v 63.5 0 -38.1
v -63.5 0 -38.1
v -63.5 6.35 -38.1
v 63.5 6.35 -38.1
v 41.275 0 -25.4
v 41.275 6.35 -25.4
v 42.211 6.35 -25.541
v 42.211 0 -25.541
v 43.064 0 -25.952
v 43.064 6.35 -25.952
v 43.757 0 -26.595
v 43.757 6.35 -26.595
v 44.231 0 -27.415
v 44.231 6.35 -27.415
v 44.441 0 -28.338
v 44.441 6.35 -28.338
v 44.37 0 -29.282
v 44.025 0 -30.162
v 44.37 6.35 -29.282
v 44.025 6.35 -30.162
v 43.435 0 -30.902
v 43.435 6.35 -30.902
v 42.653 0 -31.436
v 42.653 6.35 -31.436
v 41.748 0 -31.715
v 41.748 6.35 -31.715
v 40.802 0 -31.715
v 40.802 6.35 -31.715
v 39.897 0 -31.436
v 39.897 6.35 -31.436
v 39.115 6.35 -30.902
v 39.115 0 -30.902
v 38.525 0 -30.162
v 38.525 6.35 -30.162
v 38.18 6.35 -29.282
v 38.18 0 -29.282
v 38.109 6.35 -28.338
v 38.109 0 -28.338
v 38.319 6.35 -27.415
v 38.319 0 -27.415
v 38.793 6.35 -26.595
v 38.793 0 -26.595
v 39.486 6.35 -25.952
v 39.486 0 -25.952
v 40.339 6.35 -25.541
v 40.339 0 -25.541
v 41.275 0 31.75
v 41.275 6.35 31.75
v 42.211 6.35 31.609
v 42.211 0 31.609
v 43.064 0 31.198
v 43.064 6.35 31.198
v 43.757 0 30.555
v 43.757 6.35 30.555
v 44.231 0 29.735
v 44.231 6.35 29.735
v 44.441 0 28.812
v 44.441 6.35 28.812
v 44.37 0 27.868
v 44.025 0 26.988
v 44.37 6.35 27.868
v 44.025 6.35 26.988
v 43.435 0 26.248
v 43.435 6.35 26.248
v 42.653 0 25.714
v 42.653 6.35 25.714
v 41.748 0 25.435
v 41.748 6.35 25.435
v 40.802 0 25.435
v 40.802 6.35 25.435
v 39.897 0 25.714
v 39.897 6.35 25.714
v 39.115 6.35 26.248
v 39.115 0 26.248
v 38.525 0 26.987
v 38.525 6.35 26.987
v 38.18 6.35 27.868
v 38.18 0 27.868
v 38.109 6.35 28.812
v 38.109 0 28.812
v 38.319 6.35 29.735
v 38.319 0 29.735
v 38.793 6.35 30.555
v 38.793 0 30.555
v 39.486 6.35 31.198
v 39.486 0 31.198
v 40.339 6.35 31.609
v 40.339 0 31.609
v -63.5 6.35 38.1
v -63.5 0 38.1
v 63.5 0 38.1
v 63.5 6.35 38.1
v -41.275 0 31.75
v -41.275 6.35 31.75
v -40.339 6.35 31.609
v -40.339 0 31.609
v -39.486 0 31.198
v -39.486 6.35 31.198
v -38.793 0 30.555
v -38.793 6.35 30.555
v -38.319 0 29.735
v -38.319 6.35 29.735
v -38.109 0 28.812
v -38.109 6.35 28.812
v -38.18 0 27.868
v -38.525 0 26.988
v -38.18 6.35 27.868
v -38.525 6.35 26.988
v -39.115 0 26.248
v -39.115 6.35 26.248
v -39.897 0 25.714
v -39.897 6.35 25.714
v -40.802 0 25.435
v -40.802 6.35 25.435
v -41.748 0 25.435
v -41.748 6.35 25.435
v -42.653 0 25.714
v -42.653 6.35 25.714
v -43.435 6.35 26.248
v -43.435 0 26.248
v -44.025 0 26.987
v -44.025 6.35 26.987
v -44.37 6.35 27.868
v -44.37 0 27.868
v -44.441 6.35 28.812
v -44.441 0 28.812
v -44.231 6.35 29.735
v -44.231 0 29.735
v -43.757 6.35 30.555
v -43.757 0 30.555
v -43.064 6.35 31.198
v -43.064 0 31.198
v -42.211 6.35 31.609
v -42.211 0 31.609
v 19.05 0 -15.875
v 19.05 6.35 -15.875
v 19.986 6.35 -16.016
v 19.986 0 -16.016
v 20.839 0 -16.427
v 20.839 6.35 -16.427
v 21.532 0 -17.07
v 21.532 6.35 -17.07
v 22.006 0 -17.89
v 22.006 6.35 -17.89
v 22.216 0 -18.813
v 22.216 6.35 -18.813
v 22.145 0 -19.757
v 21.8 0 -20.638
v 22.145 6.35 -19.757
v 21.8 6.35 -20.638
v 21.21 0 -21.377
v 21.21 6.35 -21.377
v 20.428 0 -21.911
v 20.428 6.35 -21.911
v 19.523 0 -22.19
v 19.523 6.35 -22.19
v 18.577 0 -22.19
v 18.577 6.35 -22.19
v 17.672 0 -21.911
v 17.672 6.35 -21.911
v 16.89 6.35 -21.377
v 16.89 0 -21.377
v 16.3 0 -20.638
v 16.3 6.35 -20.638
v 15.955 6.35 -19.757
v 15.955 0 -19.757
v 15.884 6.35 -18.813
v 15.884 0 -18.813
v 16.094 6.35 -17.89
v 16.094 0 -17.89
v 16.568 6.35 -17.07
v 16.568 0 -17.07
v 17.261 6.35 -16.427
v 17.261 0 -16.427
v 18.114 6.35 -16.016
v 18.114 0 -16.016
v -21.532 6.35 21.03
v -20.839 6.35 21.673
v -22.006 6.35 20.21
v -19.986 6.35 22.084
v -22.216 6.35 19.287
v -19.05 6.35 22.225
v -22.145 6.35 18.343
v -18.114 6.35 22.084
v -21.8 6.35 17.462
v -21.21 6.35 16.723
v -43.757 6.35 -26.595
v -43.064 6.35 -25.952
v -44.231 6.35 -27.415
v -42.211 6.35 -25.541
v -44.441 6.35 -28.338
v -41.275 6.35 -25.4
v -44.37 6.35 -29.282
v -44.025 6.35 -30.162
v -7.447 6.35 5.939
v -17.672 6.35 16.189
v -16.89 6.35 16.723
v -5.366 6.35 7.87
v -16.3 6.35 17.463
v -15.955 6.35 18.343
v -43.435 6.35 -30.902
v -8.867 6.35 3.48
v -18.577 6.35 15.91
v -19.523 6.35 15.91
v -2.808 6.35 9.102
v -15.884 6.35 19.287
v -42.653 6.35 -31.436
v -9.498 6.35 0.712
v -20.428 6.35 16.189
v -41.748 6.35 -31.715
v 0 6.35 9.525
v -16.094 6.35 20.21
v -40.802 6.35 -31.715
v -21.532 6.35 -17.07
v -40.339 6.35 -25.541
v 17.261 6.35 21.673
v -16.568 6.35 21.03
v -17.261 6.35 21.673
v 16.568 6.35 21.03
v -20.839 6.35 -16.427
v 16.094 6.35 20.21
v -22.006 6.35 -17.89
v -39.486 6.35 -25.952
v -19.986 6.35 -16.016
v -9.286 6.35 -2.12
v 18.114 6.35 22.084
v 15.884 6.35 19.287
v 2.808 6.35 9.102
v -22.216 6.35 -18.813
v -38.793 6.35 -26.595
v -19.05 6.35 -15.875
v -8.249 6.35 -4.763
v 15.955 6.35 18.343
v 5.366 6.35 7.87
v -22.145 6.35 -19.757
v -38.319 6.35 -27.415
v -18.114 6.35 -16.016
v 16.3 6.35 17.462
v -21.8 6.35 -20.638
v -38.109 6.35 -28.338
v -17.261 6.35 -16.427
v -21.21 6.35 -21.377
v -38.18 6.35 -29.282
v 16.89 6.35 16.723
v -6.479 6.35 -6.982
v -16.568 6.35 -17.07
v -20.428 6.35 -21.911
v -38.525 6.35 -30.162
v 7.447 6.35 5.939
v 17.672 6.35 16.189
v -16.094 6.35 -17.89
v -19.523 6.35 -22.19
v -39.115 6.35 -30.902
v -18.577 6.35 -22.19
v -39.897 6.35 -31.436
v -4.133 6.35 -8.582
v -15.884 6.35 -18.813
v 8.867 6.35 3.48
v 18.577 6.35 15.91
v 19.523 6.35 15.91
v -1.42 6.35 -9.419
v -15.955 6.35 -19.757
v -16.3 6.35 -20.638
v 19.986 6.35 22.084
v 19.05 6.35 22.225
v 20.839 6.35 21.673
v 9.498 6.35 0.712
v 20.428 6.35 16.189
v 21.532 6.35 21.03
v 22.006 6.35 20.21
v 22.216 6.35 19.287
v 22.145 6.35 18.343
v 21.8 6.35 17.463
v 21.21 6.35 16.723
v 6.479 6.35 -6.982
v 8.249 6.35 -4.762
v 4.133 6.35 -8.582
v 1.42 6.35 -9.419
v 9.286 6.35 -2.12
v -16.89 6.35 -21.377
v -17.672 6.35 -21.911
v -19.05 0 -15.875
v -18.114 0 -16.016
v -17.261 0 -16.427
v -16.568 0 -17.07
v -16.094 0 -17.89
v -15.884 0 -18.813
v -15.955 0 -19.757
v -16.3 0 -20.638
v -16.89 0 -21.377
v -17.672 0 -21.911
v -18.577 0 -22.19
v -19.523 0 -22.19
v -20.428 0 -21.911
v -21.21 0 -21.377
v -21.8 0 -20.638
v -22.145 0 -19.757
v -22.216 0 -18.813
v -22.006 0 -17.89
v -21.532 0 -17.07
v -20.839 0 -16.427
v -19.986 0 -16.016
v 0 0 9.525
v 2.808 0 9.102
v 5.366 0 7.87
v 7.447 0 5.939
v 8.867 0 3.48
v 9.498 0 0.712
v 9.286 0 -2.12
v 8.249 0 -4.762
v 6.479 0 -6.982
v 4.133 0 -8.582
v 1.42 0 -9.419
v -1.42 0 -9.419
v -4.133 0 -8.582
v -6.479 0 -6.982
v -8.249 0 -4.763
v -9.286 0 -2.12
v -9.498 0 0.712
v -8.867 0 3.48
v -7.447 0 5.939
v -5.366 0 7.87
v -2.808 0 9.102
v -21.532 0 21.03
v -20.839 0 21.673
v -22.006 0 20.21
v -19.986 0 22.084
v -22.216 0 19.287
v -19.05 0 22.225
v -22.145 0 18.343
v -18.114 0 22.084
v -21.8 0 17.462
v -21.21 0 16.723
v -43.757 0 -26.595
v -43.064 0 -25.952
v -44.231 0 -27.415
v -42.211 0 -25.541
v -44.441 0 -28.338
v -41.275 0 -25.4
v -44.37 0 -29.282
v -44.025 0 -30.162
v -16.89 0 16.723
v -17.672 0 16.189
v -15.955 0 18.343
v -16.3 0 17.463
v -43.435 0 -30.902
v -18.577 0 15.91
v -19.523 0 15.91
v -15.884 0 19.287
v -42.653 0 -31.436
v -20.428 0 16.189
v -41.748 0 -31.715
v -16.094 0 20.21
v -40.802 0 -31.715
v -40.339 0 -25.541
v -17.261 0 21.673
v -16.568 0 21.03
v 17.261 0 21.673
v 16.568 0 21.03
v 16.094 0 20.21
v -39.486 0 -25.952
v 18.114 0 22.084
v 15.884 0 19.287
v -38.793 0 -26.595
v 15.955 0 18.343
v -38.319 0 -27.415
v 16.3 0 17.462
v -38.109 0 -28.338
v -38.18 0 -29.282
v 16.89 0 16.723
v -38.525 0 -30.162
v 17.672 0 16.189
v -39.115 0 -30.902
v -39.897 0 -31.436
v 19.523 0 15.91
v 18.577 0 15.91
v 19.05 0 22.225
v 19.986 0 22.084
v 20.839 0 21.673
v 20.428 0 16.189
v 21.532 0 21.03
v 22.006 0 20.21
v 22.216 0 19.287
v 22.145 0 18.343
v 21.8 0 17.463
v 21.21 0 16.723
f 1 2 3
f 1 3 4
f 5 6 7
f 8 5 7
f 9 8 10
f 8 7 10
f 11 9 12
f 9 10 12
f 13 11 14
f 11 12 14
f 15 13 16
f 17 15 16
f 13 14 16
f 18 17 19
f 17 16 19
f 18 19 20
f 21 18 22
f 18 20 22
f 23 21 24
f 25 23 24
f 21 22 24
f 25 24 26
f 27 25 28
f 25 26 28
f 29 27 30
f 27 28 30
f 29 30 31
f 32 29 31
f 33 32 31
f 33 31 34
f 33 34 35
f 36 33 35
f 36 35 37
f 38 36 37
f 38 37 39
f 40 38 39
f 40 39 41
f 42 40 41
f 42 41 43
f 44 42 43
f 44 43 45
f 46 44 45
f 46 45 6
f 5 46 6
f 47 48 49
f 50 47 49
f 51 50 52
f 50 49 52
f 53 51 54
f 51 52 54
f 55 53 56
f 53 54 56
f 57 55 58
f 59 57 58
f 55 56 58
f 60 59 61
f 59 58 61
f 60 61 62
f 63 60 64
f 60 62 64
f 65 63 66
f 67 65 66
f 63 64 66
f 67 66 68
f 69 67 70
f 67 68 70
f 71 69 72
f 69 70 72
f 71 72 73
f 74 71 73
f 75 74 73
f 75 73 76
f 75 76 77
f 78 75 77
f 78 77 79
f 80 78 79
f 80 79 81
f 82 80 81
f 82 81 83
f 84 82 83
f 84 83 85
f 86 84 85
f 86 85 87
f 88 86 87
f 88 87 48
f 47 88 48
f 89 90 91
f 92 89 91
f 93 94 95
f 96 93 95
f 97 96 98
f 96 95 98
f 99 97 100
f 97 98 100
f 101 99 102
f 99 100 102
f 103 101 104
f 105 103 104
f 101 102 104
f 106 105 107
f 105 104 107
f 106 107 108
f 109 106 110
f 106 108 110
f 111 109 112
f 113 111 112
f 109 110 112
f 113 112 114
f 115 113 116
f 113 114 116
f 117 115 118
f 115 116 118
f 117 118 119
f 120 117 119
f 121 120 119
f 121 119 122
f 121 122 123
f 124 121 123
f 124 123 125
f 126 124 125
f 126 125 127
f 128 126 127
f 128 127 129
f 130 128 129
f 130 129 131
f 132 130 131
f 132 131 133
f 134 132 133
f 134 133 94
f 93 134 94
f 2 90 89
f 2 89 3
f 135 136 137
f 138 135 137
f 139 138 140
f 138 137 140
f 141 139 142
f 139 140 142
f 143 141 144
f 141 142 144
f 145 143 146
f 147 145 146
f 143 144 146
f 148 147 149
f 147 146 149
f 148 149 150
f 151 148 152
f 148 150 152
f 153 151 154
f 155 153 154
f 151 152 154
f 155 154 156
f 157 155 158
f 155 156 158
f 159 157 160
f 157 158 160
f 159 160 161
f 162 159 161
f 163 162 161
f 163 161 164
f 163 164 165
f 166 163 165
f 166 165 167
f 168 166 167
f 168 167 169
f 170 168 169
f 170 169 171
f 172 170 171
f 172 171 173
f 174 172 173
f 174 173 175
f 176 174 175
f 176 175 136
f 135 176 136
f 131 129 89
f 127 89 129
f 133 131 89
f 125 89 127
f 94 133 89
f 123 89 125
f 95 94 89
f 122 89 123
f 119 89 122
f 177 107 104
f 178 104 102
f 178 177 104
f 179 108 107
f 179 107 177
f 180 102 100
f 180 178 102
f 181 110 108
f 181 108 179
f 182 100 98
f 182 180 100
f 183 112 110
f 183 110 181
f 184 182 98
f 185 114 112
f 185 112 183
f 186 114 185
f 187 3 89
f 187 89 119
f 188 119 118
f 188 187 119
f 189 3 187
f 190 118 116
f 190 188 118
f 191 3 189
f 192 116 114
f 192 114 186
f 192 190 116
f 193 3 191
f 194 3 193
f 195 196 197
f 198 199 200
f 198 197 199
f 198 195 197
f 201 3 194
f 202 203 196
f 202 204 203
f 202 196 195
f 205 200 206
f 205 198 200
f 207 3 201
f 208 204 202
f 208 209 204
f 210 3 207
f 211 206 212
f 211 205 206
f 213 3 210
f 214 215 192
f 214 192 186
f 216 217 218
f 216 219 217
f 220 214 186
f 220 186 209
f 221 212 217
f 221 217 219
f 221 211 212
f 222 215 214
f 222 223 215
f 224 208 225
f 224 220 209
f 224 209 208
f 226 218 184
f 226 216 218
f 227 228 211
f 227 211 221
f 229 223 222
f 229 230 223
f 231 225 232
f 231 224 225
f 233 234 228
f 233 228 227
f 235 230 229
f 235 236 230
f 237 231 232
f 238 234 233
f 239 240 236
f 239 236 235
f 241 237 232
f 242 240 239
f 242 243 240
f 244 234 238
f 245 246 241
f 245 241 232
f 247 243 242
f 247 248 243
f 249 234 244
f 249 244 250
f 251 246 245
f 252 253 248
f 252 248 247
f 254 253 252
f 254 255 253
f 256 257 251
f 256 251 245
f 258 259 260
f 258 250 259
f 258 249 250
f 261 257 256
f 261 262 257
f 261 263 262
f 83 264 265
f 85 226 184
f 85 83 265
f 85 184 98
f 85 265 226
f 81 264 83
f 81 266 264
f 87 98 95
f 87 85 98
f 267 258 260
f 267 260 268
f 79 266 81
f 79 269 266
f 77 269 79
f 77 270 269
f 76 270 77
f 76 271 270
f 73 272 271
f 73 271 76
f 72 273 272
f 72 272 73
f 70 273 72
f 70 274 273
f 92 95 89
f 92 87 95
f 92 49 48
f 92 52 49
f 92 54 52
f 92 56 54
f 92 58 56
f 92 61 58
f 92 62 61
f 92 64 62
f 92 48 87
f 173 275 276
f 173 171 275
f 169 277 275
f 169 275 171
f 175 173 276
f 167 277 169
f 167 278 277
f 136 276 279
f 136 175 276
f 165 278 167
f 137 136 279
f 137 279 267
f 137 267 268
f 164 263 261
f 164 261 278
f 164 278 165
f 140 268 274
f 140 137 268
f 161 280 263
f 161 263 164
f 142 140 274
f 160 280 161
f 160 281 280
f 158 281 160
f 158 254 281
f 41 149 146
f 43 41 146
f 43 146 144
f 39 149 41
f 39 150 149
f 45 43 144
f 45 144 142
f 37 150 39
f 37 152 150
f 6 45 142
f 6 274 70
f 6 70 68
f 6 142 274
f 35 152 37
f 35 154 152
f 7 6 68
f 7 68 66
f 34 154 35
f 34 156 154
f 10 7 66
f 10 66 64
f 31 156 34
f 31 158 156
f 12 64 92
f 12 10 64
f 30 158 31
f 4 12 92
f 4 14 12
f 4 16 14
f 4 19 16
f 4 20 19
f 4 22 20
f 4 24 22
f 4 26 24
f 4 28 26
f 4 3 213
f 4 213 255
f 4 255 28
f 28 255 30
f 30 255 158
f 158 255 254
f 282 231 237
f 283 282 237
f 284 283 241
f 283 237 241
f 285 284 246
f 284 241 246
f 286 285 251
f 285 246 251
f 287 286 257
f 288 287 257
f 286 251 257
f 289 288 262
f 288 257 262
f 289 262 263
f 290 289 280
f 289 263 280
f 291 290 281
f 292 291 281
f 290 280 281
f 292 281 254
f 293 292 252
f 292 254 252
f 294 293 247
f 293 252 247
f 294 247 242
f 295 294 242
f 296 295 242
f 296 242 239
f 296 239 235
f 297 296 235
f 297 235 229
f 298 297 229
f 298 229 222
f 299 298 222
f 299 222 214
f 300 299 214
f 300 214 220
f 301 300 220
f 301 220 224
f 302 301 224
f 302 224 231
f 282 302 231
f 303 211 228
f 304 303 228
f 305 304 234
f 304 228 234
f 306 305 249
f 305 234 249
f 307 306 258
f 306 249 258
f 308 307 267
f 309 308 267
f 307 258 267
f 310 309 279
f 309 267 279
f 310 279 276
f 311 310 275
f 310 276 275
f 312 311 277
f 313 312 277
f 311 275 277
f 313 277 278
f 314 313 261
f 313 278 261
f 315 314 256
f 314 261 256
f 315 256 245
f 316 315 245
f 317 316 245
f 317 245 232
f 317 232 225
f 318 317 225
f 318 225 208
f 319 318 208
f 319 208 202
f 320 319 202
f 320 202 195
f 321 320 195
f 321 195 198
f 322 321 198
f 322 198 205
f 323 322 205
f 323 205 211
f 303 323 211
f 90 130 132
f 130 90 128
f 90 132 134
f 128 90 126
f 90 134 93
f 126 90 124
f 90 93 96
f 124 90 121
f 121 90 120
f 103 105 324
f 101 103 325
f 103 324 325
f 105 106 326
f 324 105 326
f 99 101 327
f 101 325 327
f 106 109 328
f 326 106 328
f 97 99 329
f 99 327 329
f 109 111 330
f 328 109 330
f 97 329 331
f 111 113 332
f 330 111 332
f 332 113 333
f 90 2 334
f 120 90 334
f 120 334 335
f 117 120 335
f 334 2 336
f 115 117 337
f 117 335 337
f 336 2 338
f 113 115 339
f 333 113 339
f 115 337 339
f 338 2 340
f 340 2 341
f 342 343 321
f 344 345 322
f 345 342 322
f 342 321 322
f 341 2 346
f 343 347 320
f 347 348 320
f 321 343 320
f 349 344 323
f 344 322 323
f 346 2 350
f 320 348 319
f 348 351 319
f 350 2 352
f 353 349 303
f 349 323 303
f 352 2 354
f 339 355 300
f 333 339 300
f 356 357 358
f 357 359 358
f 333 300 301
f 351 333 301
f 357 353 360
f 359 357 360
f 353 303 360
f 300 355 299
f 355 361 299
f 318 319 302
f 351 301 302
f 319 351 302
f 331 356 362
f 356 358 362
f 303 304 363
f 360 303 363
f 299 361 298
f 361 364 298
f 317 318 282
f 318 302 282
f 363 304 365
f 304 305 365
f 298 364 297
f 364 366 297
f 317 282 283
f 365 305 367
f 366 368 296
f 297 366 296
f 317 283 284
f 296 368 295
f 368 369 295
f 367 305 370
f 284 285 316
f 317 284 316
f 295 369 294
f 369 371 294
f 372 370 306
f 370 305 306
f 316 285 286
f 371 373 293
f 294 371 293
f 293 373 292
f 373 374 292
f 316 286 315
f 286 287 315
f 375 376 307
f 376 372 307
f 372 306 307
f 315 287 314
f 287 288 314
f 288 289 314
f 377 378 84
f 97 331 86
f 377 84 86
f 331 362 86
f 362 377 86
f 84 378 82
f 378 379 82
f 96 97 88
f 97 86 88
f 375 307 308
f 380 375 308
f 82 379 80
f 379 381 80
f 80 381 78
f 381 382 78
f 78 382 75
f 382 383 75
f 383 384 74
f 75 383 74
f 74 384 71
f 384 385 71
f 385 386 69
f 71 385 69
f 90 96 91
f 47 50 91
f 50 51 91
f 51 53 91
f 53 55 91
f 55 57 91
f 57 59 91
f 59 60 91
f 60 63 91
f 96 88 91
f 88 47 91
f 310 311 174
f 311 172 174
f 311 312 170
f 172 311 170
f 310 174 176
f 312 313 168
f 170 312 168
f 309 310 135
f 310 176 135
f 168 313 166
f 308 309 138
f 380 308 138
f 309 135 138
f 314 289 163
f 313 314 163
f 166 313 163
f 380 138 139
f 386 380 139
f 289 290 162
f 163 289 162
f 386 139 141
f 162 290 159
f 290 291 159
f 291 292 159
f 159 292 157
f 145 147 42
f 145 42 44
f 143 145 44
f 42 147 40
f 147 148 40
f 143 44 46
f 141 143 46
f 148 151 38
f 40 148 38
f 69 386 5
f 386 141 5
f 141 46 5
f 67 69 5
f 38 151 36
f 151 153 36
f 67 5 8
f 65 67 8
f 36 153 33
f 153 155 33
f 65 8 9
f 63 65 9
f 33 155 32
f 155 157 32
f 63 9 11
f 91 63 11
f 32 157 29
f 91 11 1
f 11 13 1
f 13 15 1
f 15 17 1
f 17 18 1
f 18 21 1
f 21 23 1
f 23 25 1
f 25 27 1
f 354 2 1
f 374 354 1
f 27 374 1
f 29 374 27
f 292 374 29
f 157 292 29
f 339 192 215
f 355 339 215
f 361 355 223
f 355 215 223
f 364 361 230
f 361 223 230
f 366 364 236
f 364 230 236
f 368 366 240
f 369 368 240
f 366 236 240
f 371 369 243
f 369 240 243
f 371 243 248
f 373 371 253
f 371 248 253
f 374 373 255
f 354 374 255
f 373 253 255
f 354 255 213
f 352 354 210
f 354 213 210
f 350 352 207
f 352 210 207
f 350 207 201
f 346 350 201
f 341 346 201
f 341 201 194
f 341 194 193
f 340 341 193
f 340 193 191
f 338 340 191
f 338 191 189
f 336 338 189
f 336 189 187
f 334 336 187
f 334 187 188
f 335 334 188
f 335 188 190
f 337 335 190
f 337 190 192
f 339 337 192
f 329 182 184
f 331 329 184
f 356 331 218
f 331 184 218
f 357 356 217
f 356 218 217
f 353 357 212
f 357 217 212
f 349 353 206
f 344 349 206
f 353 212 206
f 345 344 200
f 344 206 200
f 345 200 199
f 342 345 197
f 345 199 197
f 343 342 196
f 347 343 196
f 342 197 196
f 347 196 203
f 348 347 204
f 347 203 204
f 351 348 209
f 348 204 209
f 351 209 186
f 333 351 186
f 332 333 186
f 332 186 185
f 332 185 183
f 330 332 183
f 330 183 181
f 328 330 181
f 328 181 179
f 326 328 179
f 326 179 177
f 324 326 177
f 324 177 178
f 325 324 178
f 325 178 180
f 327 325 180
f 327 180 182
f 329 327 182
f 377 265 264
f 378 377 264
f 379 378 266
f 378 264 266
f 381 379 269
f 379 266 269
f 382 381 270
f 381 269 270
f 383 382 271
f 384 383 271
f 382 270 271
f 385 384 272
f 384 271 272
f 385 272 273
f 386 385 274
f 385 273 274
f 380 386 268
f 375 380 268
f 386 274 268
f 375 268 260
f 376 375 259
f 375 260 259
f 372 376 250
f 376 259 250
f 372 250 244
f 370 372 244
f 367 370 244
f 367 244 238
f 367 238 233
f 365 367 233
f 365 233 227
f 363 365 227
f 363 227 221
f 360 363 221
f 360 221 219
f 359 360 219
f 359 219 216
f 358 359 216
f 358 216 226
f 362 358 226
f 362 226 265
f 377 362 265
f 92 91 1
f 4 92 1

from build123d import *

# Parameters (mm, degrees)
SKETCH1_W           = 127
SKETCH1_H           = 76.2
BOSS_EXTRUDE1_DEPTH = 6.35
SKETCH2_R           = 3.175
SKETCH2_R_2         = 9.525
CUT_EXTRUDE1_DEPTH  = 75.324844433


with BuildPart() as part:
    # Sketch1 → Boss-Extrude1 (new body)
    with BuildSketch(Plane(origin=(0, 0, 0), x_dir=(1, 0, 0), z_dir=(0, 1, 0))):
        Rectangle(SKETCH1_W, SKETCH1_H)
    extrude(amount=BOSS_EXTRUDE1_DEPTH)

    # Sketch2 → Cut-Extrude1 (cut, through all)
    with BuildSketch(Plane(origin=(0, 6.35, 0), x_dir=(1, 0, 0), z_dir=(0, 1, 0))):
        with Locations(Location((-41.275, 28.575, 0), (0, 0, 270))):
            Circle(SKETCH2_R)
        with Locations(Location((41.275, 28.575, 0), (0, 0, 270))):
            Circle(SKETCH2_R)
        with Locations(Location((41.275, -28.575, 0), (0, 0, 270))):
            Circle(SKETCH2_R)
        with Locations(Location((-41.275, -28.575, 0), (0, 0, 270))):
            Circle(SKETCH2_R)
        with Locations(Location((-19.05, 19.05, 0), (0, 0, 270))):
            Circle(SKETCH2_R)
        with Locations(Location((19.05, 19.05, 0), (0, 0, 270))):
            Circle(SKETCH2_R)
        with Locations(Location((19.05, -19.05, 0), (0, 0, 270))):
            Circle(SKETCH2_R)
        with Locations(Location((-19.05, -19.05, 0), (0, 0, 270))):
            Circle(SKETCH2_R)
        with Locations(Location((0, 0, 0), (0, 0, 270))):
            Circle(SKETCH2_R_2)
    extrude(amount=-CUT_EXTRUDE1_DEPTH, mode=Mode.SUBTRACT)


solid = part.part
